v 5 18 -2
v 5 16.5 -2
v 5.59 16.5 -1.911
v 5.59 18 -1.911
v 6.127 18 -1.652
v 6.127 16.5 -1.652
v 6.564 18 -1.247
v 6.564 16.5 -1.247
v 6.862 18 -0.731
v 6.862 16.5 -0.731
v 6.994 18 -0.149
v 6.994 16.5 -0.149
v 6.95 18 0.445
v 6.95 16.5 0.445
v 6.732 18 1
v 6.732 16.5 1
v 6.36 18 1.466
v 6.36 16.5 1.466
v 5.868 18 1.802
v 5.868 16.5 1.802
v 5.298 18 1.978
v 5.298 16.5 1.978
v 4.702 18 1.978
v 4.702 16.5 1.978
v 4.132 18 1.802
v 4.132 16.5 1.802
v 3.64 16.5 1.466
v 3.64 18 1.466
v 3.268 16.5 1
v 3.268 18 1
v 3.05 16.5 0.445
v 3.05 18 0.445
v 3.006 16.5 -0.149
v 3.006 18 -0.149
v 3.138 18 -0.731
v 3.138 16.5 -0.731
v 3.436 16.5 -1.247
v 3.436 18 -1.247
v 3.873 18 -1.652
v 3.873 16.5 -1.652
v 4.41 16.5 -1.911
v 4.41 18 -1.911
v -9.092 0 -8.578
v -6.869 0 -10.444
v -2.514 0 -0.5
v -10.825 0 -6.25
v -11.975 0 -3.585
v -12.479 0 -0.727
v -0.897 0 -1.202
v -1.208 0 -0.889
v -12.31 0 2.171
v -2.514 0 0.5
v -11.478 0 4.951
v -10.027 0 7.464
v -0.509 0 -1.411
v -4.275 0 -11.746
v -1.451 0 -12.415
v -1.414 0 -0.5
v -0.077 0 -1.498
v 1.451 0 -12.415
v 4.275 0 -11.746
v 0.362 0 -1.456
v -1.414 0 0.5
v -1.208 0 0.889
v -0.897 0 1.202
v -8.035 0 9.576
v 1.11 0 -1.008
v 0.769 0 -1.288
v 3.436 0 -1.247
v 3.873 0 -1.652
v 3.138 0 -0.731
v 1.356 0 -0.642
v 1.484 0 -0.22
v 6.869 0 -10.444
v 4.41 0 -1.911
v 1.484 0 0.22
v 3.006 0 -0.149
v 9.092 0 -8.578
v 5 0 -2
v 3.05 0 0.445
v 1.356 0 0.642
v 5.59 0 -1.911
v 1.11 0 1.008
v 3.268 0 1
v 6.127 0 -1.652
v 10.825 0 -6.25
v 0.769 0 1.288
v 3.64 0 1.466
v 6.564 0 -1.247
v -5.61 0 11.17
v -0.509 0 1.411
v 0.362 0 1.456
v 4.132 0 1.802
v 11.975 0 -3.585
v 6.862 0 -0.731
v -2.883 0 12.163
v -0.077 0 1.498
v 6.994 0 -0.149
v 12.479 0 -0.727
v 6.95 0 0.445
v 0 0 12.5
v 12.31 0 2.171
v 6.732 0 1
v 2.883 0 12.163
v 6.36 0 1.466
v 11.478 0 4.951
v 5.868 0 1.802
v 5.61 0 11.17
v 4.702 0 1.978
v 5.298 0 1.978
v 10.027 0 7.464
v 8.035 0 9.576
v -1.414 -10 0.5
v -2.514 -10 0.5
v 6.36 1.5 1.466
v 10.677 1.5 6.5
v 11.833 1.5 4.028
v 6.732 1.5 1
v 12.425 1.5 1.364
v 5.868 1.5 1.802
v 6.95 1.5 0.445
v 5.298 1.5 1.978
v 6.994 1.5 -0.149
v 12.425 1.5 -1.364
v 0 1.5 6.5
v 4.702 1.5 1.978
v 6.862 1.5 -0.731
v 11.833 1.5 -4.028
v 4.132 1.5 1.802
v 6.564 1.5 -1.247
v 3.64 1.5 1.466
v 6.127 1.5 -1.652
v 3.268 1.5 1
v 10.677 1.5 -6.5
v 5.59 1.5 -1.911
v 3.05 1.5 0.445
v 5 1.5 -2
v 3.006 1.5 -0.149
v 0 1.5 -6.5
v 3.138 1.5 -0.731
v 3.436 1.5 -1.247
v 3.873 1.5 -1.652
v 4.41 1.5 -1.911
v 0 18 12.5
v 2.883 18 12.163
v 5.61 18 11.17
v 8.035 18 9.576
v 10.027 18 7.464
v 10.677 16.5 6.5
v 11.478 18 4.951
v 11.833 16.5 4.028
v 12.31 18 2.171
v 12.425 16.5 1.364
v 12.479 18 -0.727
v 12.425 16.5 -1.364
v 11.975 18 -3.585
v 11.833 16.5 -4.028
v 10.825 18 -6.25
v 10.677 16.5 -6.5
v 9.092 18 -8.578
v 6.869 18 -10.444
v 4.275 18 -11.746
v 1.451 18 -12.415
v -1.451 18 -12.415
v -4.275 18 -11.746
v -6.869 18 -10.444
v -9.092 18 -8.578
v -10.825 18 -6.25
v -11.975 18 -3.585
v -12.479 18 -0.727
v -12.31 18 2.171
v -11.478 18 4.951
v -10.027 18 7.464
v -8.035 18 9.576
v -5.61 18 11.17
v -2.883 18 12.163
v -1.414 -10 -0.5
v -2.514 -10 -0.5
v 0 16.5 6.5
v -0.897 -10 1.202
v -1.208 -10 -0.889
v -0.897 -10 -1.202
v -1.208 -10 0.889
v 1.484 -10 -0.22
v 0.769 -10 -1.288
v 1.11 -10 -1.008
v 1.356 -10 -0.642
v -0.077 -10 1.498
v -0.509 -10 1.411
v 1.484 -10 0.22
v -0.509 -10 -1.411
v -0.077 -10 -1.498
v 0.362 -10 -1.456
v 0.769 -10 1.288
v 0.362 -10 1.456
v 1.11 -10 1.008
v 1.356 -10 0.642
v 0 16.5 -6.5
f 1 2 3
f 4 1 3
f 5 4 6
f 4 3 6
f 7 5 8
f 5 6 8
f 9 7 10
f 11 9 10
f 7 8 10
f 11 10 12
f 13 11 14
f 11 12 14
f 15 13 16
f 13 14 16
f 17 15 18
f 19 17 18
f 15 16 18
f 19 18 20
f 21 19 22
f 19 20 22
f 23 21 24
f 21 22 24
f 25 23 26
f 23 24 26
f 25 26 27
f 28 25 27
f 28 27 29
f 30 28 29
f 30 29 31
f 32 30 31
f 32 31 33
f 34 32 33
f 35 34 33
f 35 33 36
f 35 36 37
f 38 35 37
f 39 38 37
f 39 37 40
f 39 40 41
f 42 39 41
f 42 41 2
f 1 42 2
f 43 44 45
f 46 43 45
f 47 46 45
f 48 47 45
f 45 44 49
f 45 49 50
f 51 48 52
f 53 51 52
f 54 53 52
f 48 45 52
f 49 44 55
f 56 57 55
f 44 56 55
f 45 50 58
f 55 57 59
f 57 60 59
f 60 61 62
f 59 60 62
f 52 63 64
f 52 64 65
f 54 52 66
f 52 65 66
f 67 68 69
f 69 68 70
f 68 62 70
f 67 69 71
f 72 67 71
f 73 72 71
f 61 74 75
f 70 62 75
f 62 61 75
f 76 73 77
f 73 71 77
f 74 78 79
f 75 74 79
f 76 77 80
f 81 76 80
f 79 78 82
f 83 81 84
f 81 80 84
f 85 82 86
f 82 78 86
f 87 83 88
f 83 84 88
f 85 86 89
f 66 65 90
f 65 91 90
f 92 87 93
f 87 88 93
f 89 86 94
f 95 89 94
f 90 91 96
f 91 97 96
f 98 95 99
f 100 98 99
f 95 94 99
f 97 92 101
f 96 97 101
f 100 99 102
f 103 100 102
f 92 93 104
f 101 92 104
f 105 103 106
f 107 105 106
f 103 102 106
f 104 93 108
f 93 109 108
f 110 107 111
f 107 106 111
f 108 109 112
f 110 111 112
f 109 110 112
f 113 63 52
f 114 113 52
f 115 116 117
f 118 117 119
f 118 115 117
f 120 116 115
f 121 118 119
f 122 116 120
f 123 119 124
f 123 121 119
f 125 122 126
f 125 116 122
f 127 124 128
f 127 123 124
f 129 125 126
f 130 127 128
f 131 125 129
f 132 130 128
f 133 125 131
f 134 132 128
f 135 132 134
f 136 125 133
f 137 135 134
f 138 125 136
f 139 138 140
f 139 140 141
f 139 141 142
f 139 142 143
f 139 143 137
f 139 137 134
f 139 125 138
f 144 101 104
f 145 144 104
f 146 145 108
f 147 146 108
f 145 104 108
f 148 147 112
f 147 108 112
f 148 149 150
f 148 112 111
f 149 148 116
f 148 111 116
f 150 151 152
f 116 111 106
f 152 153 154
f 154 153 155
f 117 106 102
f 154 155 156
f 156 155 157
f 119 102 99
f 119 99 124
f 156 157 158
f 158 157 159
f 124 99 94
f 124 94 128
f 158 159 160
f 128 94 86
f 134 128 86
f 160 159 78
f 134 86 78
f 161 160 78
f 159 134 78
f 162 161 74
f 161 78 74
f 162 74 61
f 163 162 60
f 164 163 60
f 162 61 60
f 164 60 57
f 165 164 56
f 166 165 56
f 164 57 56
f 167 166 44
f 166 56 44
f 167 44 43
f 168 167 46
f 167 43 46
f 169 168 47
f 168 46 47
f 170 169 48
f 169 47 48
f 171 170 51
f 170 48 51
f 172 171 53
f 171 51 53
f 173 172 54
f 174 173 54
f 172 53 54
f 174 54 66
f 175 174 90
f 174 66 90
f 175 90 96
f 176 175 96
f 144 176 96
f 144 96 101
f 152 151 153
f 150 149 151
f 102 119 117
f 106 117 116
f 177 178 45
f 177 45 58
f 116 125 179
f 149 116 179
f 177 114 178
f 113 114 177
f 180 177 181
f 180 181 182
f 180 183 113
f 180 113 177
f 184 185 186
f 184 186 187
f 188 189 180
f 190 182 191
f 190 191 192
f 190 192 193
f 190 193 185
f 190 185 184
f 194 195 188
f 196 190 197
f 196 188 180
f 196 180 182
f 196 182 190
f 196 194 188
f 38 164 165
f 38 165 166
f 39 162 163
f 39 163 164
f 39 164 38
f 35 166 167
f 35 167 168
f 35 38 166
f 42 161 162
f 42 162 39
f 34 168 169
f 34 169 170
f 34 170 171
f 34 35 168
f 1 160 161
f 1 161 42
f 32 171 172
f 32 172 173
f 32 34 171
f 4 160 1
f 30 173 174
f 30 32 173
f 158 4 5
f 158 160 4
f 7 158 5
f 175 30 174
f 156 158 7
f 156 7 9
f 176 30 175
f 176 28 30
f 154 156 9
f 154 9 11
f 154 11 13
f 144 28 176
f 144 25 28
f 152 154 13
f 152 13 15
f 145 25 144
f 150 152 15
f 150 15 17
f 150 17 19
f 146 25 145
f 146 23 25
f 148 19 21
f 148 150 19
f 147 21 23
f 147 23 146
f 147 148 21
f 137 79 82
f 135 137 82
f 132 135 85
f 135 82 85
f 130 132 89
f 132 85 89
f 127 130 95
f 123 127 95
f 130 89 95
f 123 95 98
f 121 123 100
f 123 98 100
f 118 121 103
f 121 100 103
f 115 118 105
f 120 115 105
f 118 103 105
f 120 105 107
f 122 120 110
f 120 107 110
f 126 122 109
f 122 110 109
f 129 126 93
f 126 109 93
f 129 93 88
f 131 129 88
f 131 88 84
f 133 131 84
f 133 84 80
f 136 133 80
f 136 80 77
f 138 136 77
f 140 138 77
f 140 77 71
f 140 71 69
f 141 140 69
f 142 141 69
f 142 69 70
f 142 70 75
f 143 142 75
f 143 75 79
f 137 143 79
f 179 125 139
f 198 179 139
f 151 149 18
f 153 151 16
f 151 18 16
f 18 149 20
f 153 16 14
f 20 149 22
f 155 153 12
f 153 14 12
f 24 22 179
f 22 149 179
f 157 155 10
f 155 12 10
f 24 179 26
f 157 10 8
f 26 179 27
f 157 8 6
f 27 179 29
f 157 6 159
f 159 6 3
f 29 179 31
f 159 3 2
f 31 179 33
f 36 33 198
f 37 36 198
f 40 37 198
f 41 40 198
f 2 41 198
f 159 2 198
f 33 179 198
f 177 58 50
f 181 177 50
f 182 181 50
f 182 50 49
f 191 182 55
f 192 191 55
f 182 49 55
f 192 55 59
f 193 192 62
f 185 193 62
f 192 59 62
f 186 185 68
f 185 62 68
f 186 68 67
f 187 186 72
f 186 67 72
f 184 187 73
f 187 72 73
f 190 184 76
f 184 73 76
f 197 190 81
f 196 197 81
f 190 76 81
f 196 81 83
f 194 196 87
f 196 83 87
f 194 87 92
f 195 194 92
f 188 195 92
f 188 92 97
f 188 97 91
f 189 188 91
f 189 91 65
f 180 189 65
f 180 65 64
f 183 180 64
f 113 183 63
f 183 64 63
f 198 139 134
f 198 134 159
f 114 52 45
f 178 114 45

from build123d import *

# Parameters (mm, degrees)
SKETCH1_R           = 12.5
BOSS_EXTRUDE1_DEPTH = 18
SKETCH2_W           = 13
SKETCH2_H           = 15
CUT_EXTRUDE1_DEPTH  = 18
SKETCH3_R           = 2
SKETCH3_R_2         = 1
CUT_EXTRUDE2_DEPTH  = 26.228951623
BOSS_EXTRUDE2_DEPTH = 10


with BuildPart() as part:
    # Sketch1 → Boss-Extrude1 (new body)
    with BuildSketch(Plane(origin=(0, 0, 0), x_dir=(1, 0, 0), z_dir=(0, 1, 0))):
        with Locations(Location((0, 0, 0), (0, 0, 270))):
            Circle(SKETCH1_R)
    extrude(amount=BOSS_EXTRUDE1_DEPTH)

    # Sketch2 → Cut-Extrude1 (cut)
    with BuildSketch(Plane(origin=(0, 0, 0), x_dir=(0, 0, -1), z_dir=(1, 0, 0))):
        with Locations((0, 9)):
            Rectangle(SKETCH2_W, SKETCH2_H)
    extrude(amount=CUT_EXTRUDE1_DEPTH, mode=Mode.SUBTRACT)

    # Sketch3 → Cut-Extrude2 (cut, through all)
    # profile 1 of 2: a face of its own
    with BuildSketch(Plane.XZ):
        with Locations(Location((5, 0, 0), (0, 0, 270))):
            Circle(SKETCH3_R)
        with Locations((5, 0)):
            Circle(SKETCH3_R_2, mode=Mode.SUBTRACT)
    # profile 2 of 2: a face of its own
    with BuildSketch(Plane.XZ):
        with Locations((5, 0)):
            Circle(SKETCH3_R_2)
    extrude(amount=-CUT_EXTRUDE2_DEPTH, mode=Mode.SUBTRACT)

    # Sketch5 → Boss-Extrude2 (add)
    with BuildSketch(Plane.XZ):
        with BuildLine():
            Line((-1.414213562, 0.5), (-2.514213562, 0.5))
            Line((-2.514213562, 0.5), (-2.514213562, -0.5))
            Line((-2.514213562, -0.5), (-1.414213562, -0.5))
            ThreePointArc((-1.414213562, -0.5), (1.5, 0), (-1.414213562, 0.5))
        make_face()
    extrude(amount=BOSS_EXTRUDE2_DEPTH)


solid = part.part
